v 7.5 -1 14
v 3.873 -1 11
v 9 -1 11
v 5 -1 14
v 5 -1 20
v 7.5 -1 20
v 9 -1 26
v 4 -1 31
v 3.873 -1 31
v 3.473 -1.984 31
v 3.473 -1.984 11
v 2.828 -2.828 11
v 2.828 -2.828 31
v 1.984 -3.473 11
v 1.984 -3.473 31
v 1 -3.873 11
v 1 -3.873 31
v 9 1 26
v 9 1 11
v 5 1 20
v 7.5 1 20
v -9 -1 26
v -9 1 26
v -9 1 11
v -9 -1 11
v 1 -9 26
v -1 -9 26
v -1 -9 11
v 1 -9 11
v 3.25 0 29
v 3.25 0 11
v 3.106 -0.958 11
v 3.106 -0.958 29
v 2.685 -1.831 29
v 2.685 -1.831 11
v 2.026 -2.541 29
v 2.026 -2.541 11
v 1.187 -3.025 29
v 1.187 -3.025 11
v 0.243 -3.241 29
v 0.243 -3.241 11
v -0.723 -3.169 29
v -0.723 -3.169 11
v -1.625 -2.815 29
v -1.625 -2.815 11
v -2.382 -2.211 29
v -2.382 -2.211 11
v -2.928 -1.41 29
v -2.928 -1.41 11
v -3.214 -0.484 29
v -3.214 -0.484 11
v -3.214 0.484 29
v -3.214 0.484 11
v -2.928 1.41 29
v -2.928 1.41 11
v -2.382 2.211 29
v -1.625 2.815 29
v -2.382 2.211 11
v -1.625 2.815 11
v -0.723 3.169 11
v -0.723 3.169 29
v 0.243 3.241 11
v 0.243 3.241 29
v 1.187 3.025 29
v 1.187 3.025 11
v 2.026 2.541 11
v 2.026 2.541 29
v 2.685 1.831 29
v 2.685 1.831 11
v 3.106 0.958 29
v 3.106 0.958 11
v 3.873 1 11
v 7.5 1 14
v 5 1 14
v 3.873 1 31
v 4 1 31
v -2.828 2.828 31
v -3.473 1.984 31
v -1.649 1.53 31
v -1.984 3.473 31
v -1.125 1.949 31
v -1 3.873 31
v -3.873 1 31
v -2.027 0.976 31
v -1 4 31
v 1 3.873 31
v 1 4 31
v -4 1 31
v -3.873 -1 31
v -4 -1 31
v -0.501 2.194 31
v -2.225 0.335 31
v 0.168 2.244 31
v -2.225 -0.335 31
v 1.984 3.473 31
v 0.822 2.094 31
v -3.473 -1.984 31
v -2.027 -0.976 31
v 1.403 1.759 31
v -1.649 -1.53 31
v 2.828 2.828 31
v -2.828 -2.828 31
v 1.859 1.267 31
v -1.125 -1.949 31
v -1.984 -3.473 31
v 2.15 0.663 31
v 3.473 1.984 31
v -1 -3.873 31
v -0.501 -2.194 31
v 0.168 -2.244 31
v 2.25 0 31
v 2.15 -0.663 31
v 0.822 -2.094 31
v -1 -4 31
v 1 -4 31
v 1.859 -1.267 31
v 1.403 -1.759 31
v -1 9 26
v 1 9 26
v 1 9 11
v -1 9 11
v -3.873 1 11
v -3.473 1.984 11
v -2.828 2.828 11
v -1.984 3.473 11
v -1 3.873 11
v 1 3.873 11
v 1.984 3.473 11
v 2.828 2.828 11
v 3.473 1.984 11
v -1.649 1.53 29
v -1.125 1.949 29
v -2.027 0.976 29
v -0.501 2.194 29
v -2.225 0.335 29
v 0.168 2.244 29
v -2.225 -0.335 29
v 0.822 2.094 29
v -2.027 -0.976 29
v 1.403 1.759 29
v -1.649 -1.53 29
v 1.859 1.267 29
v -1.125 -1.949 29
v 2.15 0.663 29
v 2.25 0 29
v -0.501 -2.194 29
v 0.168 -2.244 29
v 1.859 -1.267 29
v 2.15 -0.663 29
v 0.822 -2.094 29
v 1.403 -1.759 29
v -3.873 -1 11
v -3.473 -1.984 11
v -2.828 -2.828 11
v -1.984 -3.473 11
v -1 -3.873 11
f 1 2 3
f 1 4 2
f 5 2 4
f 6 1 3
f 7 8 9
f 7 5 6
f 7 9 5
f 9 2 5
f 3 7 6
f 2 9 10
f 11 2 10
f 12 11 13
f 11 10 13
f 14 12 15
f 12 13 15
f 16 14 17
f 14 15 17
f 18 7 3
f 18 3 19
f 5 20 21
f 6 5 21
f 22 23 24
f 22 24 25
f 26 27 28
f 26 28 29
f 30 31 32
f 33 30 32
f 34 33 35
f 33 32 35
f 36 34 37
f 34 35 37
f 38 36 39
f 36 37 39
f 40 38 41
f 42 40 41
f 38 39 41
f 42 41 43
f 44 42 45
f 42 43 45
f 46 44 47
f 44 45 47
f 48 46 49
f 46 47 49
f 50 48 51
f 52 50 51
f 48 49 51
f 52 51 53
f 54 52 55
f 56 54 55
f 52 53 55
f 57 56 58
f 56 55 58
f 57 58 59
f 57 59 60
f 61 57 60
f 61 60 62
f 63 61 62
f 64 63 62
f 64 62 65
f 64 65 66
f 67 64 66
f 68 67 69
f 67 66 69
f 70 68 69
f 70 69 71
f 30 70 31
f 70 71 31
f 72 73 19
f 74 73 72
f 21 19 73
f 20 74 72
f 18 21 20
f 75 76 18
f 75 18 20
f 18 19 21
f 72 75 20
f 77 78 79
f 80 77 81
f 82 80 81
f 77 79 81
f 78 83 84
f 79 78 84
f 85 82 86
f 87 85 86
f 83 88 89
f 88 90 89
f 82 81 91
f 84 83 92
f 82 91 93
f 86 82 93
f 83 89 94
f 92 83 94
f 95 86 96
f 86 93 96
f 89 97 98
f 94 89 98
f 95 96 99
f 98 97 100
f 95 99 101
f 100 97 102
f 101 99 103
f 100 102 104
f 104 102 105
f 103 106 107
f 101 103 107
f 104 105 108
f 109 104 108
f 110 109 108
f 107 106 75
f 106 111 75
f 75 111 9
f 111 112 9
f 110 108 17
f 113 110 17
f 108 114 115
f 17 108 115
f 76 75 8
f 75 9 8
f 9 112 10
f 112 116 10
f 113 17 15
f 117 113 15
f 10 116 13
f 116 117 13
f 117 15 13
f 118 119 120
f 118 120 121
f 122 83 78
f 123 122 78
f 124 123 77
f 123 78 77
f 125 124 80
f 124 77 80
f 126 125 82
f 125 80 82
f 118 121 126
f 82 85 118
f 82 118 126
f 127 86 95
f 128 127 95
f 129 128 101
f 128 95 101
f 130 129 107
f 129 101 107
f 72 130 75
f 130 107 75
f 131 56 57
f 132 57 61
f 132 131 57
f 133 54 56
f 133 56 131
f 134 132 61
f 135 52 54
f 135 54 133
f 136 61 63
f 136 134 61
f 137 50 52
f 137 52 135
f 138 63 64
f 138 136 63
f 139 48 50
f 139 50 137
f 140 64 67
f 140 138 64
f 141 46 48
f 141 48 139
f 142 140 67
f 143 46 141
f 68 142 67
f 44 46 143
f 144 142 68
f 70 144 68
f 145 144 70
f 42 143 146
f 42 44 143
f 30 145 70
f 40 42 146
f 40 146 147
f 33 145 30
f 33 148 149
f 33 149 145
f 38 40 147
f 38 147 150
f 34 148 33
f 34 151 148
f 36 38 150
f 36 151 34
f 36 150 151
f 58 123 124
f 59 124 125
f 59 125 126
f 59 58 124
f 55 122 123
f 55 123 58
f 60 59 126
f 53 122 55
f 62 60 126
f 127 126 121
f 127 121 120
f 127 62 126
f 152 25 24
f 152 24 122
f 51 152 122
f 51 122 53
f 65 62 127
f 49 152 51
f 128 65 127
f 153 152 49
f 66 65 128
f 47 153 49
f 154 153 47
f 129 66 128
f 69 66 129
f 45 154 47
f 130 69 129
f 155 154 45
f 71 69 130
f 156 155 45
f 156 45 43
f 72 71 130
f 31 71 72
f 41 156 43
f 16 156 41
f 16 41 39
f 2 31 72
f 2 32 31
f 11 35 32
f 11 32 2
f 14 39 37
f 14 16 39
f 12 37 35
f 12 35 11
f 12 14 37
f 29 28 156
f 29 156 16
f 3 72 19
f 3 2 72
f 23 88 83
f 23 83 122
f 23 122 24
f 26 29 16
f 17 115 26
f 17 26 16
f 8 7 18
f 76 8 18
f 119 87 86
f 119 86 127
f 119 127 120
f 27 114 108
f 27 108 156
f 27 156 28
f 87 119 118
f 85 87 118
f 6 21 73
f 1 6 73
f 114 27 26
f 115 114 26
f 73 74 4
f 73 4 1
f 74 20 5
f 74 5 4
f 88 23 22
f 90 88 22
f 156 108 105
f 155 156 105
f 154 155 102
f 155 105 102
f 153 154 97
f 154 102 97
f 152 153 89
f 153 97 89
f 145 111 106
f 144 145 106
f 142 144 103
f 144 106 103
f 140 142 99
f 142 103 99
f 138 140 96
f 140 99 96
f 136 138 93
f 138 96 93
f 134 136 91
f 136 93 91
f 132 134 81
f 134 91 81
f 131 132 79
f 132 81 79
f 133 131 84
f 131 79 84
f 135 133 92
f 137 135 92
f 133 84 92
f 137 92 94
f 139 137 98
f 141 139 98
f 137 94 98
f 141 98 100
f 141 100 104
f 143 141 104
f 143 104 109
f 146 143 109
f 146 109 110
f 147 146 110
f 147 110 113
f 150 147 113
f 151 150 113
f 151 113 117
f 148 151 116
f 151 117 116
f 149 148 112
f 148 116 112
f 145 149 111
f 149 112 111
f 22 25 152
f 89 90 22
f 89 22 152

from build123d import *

# Parameters (mm, degrees)
PAD_DEPTH            = 20
SKETCH001_W          = 2.5
SKETCH001_H          = 6
POCKET_DEPTH         = 10.001
SKETCH002_R          = 3.25
POCKET001_DEPTH      = 18
SKETCH003_R          = 2.25
POCKET002_DEPTH      = 2
CHAMFER_SIZE         = 5
BODY_PLACEMENT_ANGLE = 180


with BuildPart() as part:
    # Sketch → Pad (new body)
    with BuildSketch(Plane.XY):
        with BuildLine():
            ThreePointArc((-3.872983, -1), (-2.828427, -2.828427), (-1, -3.872983))
            Line((-1, -9), (-1, -3.872983))
            Line((1, -9), (-1, -9))
            Line((1, -3.872983), (1, -9))
            ThreePointArc((1, -3.872983), (2.828427, -2.828427), (3.872983, -1))
            Line((9, -1), (3.872983, -1))
            Line((9, 1), (9, -1))
            Line((3.872983, 1), (9, 1))
            ThreePointArc((3.872983, 1), (2.828427, 2.828427), (1, 3.872983))
            Line((1, 9), (1, 3.872983))
            Line((-1, 9), (1, 9))
            Line((-1, 3.872983), (-1, 9))
            ThreePointArc((-1, 3.872983), (-2.828427, 2.828427), (-3.872983, 1))
            Line((-9, 1), (-3.872983, 1))
            Line((-9, -1), (-9, 1))
            Line((-3.872983, -1), (-9, -1))
        make_face()
    extrude(amount=PAD_DEPTH)

    # Sketch001 (on Face6 of Pad) → Pocket (cut, through all)
    with BuildSketch(Plane.XZ.offset(1)):
        with Locations((6.25, 14)):
            Rectangle(SKETCH001_W, SKETCH001_H)
    extrude(amount=-POCKET_DEPTH, mode=Mode.SUBTRACT)

    # Sketch002 (on Face5 of Pocket) → Pocket001 (cut)
    with BuildSketch(Plane.XY.offset(20)):
        Circle(SKETCH002_R)
    extrude(amount=-POCKET001_DEPTH, mode=Mode.SUBTRACT)

    # Sketch003 (on Face4 of Pocket001) → Pocket002 (cut)
    with BuildSketch(Plane(origin=(0, 0, 0), x_dir=(1, 0, 0), z_dir=(0, 0, -1))):
        Circle(SKETCH003_R)
    extrude(amount=-POCKET002_DEPTH, mode=Mode.SUBTRACT)

    # Chamfer
    chamfer_edges = [part.edges().sort_by_distance(p)[0] for p in [
        (-9, 0, 0),
        (0, -9, 0),
        (9, 0, 0),
        (0, 9, 0),
    ]]
    chamfer(chamfer_edges, length=CHAMFER_SIZE)


with BuildPart() as part_1:
    # Body placement: moved
    add(part.part.moved(Location((0, 0, 31))).rotate(Axis((0, 0, 31), (1, 0, 0)), BODY_PLACEMENT_ANGLE))


solid = part_1.part
